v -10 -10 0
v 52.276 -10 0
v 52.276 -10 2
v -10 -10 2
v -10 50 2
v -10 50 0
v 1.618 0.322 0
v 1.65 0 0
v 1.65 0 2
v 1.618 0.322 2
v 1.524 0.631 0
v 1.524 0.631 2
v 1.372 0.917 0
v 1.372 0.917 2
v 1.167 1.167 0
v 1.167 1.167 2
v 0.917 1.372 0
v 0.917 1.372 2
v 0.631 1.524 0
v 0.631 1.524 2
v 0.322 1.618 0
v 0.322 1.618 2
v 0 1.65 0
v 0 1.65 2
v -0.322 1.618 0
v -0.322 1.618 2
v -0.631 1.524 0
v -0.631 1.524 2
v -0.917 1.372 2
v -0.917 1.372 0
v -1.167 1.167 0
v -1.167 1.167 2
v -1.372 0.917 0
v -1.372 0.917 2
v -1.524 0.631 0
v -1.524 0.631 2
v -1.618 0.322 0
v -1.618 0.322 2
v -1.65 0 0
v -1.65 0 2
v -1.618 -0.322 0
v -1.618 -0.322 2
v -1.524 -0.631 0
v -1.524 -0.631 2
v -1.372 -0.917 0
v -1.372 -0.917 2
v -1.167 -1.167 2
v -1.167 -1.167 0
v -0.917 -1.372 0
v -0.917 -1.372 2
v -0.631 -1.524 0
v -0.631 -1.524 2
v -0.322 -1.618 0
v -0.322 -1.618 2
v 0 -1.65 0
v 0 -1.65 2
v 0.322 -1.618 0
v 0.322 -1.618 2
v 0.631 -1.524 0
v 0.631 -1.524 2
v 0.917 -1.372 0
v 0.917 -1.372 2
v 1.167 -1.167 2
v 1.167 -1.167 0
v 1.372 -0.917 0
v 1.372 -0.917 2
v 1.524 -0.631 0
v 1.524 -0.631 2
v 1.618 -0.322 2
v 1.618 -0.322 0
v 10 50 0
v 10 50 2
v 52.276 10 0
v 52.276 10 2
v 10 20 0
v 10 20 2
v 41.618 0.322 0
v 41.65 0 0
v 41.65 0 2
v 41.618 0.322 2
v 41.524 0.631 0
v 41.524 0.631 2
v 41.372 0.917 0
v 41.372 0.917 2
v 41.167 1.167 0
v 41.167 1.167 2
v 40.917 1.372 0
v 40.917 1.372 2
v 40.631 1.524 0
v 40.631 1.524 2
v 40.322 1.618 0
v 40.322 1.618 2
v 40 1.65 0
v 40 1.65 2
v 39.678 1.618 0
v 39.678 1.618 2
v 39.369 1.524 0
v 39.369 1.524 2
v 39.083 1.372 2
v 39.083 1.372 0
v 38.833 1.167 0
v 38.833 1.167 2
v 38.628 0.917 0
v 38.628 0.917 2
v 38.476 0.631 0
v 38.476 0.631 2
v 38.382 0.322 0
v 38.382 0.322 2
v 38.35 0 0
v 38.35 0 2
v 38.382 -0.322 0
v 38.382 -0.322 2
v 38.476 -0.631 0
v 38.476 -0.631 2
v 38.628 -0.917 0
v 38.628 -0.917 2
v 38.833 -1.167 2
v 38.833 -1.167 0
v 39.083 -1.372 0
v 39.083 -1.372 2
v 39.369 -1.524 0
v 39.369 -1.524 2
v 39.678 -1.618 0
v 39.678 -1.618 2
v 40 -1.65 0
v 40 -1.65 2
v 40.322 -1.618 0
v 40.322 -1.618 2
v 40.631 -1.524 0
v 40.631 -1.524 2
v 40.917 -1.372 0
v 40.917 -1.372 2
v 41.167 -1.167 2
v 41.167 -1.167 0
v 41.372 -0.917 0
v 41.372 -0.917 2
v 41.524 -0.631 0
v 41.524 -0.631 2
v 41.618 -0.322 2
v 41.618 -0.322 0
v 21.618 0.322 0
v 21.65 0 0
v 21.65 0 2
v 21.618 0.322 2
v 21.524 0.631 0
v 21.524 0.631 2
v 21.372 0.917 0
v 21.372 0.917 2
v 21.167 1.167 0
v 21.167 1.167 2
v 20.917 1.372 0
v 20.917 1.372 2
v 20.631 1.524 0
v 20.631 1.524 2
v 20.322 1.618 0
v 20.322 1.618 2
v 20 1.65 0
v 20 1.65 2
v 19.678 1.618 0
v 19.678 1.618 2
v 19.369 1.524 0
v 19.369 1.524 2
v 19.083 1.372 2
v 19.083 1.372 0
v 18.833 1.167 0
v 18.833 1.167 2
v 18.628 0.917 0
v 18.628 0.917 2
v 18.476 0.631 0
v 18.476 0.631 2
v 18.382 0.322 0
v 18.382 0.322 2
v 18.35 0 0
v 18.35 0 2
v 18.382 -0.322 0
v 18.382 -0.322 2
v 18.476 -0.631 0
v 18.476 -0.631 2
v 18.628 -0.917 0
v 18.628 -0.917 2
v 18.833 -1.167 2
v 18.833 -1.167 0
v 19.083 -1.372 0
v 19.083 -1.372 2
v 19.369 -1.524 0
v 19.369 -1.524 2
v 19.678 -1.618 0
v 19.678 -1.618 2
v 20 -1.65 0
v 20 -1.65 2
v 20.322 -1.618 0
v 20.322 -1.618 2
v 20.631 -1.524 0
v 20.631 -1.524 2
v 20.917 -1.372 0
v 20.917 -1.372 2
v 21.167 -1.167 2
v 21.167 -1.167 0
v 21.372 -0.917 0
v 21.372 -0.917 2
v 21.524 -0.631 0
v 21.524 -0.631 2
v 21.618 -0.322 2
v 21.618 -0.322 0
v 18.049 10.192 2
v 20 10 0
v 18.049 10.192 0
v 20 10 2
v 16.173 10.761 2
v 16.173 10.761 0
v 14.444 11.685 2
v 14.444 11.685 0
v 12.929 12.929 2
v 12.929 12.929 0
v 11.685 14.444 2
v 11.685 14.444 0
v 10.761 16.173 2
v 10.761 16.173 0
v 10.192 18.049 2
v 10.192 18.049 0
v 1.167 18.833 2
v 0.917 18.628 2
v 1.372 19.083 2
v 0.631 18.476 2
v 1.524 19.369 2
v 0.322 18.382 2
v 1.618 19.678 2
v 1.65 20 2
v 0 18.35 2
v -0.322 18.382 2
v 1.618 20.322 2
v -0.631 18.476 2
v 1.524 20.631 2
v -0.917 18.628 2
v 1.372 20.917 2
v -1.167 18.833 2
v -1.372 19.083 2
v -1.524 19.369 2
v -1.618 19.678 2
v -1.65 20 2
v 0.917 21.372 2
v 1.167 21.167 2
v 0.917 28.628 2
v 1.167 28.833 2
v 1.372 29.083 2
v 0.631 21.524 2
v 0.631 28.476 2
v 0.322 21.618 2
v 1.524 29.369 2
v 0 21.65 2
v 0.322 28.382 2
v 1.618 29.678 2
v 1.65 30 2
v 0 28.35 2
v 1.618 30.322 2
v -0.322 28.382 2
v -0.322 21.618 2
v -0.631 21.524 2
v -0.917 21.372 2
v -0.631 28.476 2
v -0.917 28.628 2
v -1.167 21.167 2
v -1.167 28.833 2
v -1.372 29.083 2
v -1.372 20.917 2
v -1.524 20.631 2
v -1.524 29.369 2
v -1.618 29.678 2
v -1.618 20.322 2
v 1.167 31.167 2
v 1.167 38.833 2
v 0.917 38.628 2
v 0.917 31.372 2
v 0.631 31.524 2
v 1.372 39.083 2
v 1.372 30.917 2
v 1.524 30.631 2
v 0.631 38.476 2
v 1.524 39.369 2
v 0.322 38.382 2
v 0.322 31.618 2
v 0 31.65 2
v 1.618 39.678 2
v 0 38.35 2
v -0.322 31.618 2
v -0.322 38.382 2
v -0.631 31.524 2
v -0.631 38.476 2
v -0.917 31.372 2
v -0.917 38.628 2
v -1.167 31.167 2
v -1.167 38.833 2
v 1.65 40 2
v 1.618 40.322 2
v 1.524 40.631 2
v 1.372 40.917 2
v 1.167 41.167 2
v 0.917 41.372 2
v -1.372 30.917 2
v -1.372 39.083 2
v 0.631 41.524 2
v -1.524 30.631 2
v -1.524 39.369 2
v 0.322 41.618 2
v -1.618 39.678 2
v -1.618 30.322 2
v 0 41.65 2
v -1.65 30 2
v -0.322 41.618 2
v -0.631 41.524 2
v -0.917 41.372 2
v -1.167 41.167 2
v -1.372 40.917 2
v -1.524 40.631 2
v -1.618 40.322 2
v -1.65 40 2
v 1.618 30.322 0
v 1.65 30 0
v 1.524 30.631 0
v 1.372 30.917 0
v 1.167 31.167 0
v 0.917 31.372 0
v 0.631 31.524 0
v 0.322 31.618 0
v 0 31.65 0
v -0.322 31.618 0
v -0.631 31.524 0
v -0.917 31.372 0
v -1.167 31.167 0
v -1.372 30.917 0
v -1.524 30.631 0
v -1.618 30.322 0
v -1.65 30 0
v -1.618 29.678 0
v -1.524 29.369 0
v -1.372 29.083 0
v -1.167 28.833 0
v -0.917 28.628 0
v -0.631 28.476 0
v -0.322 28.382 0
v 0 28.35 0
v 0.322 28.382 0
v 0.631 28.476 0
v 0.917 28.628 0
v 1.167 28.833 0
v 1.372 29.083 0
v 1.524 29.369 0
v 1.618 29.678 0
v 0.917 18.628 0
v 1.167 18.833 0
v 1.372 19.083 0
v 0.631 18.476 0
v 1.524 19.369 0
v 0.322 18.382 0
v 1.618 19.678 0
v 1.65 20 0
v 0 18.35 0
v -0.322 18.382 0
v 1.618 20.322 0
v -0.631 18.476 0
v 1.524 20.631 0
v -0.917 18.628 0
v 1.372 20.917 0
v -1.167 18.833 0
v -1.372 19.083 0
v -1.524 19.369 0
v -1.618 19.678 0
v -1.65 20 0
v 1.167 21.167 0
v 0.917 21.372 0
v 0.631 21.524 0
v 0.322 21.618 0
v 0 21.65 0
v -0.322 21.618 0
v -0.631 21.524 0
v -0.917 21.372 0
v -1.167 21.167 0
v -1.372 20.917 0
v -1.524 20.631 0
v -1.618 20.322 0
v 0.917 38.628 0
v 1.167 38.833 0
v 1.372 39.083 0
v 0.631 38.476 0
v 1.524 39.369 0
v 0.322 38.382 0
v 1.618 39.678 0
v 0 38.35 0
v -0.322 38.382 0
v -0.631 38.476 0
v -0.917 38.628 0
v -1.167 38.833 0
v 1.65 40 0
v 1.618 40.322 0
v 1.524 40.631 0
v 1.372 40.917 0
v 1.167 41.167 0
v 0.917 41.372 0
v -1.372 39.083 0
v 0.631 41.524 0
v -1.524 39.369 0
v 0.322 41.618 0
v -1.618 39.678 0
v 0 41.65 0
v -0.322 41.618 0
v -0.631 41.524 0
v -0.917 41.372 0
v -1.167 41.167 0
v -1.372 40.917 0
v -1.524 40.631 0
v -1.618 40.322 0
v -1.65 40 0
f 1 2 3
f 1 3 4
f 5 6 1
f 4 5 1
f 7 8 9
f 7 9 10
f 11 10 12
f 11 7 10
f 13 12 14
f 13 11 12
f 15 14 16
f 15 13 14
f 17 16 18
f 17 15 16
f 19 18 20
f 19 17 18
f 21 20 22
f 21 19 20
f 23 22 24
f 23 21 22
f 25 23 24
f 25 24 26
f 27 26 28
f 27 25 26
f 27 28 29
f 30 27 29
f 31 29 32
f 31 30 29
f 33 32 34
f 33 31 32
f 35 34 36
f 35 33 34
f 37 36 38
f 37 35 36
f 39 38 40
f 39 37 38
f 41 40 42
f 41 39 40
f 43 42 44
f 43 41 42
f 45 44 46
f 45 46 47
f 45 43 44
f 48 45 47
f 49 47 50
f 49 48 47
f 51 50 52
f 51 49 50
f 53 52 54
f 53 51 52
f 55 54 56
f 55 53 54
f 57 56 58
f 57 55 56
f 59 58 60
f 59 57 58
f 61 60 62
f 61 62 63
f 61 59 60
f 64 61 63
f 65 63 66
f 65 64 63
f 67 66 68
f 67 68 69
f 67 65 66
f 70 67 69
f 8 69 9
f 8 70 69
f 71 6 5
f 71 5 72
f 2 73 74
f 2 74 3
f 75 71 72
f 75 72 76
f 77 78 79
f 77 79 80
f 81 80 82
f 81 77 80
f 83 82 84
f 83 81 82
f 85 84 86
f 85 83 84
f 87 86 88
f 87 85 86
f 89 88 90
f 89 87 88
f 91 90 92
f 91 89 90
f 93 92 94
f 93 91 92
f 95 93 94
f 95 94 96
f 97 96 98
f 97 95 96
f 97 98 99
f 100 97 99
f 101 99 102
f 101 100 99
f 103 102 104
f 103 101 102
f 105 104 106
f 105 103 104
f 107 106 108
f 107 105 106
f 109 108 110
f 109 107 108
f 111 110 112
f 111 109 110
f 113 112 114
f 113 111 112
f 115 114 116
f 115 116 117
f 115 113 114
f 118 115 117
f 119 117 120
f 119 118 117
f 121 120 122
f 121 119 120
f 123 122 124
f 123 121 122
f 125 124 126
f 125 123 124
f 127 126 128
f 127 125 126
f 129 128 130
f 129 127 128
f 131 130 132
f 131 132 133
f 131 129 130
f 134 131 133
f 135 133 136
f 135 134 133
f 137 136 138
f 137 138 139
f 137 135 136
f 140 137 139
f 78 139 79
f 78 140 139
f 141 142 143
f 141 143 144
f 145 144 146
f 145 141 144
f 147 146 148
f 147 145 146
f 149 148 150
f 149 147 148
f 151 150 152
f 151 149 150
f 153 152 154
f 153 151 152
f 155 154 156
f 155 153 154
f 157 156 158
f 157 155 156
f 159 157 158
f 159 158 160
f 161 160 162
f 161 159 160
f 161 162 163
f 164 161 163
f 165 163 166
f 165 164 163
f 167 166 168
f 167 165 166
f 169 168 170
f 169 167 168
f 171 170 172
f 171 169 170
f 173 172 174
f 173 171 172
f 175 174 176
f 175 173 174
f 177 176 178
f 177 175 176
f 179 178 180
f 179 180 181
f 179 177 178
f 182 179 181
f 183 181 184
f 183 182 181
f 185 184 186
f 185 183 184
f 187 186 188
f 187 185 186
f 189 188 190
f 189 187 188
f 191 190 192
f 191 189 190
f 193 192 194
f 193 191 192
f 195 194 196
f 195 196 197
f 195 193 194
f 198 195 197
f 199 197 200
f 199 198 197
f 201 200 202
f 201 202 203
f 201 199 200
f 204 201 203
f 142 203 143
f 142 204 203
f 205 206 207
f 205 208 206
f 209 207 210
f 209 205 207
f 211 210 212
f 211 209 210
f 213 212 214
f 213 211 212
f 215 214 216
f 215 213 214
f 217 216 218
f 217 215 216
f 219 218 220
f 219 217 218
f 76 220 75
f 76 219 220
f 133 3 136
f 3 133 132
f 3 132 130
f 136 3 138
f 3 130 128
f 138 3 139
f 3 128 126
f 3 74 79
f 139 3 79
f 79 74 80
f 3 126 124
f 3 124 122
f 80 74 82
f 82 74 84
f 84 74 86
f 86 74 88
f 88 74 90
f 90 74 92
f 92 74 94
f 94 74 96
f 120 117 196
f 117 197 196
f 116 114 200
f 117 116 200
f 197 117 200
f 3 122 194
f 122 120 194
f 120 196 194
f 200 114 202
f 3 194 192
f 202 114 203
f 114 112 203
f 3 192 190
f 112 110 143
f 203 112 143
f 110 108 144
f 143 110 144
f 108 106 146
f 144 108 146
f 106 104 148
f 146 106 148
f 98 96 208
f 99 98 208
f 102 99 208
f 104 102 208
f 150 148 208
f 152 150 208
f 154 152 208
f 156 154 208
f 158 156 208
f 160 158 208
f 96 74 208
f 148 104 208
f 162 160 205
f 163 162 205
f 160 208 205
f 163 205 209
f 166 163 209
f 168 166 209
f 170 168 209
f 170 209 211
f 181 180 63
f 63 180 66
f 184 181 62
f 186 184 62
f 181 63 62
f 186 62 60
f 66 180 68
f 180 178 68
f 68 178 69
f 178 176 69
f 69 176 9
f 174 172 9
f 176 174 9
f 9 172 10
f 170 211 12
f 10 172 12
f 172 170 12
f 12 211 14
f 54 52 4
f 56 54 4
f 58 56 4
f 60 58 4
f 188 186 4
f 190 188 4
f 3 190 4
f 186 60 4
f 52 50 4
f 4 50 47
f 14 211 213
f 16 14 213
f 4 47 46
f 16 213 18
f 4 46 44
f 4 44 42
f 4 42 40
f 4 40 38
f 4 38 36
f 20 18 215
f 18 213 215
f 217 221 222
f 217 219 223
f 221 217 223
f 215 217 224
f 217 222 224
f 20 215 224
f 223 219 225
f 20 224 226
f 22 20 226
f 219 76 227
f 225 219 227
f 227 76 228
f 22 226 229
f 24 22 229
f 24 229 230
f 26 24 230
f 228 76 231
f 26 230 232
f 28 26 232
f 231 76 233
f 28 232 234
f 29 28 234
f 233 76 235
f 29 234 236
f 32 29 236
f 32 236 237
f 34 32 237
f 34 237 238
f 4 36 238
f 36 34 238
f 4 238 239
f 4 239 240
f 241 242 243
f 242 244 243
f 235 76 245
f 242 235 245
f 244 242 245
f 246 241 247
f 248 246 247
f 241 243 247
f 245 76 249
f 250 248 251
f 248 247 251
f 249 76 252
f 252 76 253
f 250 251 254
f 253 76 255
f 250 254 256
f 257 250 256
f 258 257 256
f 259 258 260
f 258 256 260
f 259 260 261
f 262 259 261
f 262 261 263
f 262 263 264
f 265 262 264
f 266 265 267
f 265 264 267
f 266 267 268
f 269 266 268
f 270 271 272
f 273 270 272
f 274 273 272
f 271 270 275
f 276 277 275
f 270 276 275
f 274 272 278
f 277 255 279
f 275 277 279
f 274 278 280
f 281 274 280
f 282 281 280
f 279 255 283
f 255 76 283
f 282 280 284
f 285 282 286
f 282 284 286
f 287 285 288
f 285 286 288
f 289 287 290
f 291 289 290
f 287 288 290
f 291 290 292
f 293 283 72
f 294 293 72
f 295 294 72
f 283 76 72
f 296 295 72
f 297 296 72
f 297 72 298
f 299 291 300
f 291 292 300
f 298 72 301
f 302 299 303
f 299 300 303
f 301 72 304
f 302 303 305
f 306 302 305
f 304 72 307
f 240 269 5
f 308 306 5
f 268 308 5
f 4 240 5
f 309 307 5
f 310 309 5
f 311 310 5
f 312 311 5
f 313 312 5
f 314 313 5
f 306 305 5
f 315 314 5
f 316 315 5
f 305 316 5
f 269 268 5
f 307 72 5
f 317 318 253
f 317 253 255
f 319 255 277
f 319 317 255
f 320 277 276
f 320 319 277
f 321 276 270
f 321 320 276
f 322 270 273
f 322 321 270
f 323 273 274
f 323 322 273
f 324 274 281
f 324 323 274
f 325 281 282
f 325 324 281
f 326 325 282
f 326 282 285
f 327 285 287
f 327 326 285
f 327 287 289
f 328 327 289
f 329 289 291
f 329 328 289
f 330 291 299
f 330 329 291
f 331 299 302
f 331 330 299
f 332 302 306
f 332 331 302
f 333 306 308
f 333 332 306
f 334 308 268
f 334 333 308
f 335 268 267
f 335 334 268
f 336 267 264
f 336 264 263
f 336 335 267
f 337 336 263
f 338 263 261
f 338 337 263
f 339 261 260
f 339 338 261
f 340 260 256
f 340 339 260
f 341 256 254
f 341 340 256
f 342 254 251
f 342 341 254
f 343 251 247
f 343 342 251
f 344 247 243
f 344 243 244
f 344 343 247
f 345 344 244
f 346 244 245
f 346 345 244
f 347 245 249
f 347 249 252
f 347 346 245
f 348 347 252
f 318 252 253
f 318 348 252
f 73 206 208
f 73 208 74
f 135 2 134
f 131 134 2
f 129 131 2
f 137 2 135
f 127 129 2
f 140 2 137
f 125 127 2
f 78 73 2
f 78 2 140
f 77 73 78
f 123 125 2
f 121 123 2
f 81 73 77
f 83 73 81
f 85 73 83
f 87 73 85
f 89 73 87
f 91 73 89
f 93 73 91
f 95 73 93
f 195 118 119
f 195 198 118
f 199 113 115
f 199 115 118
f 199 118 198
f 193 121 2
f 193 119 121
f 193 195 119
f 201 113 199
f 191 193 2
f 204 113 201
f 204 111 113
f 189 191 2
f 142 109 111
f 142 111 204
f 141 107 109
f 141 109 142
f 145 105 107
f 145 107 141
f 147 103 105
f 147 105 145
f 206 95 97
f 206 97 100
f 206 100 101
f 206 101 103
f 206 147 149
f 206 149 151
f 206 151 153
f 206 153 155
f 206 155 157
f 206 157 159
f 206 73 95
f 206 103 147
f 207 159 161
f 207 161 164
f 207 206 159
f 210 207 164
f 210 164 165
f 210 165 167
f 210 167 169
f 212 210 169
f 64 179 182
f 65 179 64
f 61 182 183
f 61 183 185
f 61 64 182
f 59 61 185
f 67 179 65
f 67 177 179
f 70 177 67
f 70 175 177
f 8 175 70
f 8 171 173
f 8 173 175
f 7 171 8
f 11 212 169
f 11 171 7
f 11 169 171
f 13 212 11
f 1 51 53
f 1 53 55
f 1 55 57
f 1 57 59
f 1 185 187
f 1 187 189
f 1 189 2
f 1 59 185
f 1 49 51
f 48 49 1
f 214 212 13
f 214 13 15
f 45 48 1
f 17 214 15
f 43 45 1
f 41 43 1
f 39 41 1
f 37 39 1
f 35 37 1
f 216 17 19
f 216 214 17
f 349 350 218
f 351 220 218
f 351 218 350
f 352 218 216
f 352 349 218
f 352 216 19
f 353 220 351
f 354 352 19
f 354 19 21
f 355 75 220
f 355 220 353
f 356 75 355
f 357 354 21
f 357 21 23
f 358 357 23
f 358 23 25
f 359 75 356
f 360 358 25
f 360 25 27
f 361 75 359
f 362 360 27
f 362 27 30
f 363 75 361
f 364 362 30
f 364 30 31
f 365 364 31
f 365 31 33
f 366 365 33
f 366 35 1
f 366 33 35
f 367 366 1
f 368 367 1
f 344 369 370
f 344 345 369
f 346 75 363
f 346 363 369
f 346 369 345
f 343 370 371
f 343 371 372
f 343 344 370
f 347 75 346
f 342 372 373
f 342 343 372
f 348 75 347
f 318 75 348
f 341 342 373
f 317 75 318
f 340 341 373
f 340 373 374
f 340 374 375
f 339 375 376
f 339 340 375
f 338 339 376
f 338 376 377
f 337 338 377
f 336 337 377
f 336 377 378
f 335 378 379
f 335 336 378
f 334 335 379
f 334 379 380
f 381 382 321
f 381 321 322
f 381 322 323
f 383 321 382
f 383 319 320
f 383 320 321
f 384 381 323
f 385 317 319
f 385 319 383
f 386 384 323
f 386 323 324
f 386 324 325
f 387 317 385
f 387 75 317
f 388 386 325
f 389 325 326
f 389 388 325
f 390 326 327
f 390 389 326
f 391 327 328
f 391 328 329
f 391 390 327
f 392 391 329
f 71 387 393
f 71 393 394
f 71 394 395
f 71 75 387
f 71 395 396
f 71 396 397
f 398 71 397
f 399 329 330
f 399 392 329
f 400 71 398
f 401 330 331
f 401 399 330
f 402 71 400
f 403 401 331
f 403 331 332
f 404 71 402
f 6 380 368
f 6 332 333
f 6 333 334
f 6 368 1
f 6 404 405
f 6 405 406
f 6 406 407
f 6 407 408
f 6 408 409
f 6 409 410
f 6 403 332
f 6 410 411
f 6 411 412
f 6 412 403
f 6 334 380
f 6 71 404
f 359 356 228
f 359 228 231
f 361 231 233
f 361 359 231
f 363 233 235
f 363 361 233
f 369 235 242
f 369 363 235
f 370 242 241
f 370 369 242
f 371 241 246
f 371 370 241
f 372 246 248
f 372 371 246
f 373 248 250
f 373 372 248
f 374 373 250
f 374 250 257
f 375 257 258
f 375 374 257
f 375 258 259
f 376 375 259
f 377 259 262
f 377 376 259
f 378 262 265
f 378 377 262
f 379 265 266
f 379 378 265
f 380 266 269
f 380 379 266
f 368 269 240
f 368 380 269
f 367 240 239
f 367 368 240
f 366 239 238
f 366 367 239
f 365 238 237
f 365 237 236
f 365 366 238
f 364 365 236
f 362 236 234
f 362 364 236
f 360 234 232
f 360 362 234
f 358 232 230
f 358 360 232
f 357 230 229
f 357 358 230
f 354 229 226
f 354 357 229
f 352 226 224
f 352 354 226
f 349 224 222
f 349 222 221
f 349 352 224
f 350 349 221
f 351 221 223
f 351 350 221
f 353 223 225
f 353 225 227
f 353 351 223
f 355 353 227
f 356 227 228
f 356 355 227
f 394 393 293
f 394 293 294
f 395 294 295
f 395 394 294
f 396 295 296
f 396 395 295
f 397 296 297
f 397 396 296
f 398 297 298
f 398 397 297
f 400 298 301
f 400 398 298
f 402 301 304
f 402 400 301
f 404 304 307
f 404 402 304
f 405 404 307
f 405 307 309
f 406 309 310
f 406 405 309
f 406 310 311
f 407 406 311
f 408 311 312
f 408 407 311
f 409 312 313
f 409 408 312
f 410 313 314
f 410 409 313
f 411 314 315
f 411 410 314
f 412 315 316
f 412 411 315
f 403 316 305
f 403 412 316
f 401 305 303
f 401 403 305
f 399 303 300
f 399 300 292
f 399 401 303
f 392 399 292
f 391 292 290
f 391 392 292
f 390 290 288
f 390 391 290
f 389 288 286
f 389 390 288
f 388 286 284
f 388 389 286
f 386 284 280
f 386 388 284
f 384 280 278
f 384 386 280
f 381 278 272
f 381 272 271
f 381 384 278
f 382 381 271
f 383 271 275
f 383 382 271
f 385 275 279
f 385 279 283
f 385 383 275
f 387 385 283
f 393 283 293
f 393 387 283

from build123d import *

# Parameters (mm, degrees)
SKETCH_1_R      = 1.65
EXTRUDE_1_DEPTH = 2
FILLET_1_R      = 10


with BuildPart() as part:
    # 草图1 → 凸台-拉伸1 (new body)
    with BuildSketch(Plane.XY):
        Polygon((10, 10), (52.276412277, 10), (52.276412277, -10), (-10, -10), (-10, 10), (-10, 50), (10, 50), align=None)
        with Locations((20, 0)):
            Circle(SKETCH_1_R, mode=Mode.SUBTRACT)
        with Locations((3.0503e-05, 20)):
            Circle(SKETCH_1_R, mode=Mode.SUBTRACT)
        with Locations((3.0503e-05, 40)):
            Circle(SKETCH_1_R, mode=Mode.SUBTRACT)
        with Locations((3.0503e-05, 30)):
            Circle(SKETCH_1_R, mode=Mode.SUBTRACT)
        Circle(SKETCH_1_R, mode=Mode.SUBTRACT)
        with Locations((40, 0)):
            Circle(SKETCH_1_R, mode=Mode.SUBTRACT)
    extrude(amount=EXTRUDE_1_DEPTH)

    # 圆角1
    fillet_1_edges = [part.edges().sort_by_distance(p)[0] for p in [
        (10, 10, 1),
    ]]
    fillet(fillet_1_edges, radius=FILLET_1_R)


solid = part.part
